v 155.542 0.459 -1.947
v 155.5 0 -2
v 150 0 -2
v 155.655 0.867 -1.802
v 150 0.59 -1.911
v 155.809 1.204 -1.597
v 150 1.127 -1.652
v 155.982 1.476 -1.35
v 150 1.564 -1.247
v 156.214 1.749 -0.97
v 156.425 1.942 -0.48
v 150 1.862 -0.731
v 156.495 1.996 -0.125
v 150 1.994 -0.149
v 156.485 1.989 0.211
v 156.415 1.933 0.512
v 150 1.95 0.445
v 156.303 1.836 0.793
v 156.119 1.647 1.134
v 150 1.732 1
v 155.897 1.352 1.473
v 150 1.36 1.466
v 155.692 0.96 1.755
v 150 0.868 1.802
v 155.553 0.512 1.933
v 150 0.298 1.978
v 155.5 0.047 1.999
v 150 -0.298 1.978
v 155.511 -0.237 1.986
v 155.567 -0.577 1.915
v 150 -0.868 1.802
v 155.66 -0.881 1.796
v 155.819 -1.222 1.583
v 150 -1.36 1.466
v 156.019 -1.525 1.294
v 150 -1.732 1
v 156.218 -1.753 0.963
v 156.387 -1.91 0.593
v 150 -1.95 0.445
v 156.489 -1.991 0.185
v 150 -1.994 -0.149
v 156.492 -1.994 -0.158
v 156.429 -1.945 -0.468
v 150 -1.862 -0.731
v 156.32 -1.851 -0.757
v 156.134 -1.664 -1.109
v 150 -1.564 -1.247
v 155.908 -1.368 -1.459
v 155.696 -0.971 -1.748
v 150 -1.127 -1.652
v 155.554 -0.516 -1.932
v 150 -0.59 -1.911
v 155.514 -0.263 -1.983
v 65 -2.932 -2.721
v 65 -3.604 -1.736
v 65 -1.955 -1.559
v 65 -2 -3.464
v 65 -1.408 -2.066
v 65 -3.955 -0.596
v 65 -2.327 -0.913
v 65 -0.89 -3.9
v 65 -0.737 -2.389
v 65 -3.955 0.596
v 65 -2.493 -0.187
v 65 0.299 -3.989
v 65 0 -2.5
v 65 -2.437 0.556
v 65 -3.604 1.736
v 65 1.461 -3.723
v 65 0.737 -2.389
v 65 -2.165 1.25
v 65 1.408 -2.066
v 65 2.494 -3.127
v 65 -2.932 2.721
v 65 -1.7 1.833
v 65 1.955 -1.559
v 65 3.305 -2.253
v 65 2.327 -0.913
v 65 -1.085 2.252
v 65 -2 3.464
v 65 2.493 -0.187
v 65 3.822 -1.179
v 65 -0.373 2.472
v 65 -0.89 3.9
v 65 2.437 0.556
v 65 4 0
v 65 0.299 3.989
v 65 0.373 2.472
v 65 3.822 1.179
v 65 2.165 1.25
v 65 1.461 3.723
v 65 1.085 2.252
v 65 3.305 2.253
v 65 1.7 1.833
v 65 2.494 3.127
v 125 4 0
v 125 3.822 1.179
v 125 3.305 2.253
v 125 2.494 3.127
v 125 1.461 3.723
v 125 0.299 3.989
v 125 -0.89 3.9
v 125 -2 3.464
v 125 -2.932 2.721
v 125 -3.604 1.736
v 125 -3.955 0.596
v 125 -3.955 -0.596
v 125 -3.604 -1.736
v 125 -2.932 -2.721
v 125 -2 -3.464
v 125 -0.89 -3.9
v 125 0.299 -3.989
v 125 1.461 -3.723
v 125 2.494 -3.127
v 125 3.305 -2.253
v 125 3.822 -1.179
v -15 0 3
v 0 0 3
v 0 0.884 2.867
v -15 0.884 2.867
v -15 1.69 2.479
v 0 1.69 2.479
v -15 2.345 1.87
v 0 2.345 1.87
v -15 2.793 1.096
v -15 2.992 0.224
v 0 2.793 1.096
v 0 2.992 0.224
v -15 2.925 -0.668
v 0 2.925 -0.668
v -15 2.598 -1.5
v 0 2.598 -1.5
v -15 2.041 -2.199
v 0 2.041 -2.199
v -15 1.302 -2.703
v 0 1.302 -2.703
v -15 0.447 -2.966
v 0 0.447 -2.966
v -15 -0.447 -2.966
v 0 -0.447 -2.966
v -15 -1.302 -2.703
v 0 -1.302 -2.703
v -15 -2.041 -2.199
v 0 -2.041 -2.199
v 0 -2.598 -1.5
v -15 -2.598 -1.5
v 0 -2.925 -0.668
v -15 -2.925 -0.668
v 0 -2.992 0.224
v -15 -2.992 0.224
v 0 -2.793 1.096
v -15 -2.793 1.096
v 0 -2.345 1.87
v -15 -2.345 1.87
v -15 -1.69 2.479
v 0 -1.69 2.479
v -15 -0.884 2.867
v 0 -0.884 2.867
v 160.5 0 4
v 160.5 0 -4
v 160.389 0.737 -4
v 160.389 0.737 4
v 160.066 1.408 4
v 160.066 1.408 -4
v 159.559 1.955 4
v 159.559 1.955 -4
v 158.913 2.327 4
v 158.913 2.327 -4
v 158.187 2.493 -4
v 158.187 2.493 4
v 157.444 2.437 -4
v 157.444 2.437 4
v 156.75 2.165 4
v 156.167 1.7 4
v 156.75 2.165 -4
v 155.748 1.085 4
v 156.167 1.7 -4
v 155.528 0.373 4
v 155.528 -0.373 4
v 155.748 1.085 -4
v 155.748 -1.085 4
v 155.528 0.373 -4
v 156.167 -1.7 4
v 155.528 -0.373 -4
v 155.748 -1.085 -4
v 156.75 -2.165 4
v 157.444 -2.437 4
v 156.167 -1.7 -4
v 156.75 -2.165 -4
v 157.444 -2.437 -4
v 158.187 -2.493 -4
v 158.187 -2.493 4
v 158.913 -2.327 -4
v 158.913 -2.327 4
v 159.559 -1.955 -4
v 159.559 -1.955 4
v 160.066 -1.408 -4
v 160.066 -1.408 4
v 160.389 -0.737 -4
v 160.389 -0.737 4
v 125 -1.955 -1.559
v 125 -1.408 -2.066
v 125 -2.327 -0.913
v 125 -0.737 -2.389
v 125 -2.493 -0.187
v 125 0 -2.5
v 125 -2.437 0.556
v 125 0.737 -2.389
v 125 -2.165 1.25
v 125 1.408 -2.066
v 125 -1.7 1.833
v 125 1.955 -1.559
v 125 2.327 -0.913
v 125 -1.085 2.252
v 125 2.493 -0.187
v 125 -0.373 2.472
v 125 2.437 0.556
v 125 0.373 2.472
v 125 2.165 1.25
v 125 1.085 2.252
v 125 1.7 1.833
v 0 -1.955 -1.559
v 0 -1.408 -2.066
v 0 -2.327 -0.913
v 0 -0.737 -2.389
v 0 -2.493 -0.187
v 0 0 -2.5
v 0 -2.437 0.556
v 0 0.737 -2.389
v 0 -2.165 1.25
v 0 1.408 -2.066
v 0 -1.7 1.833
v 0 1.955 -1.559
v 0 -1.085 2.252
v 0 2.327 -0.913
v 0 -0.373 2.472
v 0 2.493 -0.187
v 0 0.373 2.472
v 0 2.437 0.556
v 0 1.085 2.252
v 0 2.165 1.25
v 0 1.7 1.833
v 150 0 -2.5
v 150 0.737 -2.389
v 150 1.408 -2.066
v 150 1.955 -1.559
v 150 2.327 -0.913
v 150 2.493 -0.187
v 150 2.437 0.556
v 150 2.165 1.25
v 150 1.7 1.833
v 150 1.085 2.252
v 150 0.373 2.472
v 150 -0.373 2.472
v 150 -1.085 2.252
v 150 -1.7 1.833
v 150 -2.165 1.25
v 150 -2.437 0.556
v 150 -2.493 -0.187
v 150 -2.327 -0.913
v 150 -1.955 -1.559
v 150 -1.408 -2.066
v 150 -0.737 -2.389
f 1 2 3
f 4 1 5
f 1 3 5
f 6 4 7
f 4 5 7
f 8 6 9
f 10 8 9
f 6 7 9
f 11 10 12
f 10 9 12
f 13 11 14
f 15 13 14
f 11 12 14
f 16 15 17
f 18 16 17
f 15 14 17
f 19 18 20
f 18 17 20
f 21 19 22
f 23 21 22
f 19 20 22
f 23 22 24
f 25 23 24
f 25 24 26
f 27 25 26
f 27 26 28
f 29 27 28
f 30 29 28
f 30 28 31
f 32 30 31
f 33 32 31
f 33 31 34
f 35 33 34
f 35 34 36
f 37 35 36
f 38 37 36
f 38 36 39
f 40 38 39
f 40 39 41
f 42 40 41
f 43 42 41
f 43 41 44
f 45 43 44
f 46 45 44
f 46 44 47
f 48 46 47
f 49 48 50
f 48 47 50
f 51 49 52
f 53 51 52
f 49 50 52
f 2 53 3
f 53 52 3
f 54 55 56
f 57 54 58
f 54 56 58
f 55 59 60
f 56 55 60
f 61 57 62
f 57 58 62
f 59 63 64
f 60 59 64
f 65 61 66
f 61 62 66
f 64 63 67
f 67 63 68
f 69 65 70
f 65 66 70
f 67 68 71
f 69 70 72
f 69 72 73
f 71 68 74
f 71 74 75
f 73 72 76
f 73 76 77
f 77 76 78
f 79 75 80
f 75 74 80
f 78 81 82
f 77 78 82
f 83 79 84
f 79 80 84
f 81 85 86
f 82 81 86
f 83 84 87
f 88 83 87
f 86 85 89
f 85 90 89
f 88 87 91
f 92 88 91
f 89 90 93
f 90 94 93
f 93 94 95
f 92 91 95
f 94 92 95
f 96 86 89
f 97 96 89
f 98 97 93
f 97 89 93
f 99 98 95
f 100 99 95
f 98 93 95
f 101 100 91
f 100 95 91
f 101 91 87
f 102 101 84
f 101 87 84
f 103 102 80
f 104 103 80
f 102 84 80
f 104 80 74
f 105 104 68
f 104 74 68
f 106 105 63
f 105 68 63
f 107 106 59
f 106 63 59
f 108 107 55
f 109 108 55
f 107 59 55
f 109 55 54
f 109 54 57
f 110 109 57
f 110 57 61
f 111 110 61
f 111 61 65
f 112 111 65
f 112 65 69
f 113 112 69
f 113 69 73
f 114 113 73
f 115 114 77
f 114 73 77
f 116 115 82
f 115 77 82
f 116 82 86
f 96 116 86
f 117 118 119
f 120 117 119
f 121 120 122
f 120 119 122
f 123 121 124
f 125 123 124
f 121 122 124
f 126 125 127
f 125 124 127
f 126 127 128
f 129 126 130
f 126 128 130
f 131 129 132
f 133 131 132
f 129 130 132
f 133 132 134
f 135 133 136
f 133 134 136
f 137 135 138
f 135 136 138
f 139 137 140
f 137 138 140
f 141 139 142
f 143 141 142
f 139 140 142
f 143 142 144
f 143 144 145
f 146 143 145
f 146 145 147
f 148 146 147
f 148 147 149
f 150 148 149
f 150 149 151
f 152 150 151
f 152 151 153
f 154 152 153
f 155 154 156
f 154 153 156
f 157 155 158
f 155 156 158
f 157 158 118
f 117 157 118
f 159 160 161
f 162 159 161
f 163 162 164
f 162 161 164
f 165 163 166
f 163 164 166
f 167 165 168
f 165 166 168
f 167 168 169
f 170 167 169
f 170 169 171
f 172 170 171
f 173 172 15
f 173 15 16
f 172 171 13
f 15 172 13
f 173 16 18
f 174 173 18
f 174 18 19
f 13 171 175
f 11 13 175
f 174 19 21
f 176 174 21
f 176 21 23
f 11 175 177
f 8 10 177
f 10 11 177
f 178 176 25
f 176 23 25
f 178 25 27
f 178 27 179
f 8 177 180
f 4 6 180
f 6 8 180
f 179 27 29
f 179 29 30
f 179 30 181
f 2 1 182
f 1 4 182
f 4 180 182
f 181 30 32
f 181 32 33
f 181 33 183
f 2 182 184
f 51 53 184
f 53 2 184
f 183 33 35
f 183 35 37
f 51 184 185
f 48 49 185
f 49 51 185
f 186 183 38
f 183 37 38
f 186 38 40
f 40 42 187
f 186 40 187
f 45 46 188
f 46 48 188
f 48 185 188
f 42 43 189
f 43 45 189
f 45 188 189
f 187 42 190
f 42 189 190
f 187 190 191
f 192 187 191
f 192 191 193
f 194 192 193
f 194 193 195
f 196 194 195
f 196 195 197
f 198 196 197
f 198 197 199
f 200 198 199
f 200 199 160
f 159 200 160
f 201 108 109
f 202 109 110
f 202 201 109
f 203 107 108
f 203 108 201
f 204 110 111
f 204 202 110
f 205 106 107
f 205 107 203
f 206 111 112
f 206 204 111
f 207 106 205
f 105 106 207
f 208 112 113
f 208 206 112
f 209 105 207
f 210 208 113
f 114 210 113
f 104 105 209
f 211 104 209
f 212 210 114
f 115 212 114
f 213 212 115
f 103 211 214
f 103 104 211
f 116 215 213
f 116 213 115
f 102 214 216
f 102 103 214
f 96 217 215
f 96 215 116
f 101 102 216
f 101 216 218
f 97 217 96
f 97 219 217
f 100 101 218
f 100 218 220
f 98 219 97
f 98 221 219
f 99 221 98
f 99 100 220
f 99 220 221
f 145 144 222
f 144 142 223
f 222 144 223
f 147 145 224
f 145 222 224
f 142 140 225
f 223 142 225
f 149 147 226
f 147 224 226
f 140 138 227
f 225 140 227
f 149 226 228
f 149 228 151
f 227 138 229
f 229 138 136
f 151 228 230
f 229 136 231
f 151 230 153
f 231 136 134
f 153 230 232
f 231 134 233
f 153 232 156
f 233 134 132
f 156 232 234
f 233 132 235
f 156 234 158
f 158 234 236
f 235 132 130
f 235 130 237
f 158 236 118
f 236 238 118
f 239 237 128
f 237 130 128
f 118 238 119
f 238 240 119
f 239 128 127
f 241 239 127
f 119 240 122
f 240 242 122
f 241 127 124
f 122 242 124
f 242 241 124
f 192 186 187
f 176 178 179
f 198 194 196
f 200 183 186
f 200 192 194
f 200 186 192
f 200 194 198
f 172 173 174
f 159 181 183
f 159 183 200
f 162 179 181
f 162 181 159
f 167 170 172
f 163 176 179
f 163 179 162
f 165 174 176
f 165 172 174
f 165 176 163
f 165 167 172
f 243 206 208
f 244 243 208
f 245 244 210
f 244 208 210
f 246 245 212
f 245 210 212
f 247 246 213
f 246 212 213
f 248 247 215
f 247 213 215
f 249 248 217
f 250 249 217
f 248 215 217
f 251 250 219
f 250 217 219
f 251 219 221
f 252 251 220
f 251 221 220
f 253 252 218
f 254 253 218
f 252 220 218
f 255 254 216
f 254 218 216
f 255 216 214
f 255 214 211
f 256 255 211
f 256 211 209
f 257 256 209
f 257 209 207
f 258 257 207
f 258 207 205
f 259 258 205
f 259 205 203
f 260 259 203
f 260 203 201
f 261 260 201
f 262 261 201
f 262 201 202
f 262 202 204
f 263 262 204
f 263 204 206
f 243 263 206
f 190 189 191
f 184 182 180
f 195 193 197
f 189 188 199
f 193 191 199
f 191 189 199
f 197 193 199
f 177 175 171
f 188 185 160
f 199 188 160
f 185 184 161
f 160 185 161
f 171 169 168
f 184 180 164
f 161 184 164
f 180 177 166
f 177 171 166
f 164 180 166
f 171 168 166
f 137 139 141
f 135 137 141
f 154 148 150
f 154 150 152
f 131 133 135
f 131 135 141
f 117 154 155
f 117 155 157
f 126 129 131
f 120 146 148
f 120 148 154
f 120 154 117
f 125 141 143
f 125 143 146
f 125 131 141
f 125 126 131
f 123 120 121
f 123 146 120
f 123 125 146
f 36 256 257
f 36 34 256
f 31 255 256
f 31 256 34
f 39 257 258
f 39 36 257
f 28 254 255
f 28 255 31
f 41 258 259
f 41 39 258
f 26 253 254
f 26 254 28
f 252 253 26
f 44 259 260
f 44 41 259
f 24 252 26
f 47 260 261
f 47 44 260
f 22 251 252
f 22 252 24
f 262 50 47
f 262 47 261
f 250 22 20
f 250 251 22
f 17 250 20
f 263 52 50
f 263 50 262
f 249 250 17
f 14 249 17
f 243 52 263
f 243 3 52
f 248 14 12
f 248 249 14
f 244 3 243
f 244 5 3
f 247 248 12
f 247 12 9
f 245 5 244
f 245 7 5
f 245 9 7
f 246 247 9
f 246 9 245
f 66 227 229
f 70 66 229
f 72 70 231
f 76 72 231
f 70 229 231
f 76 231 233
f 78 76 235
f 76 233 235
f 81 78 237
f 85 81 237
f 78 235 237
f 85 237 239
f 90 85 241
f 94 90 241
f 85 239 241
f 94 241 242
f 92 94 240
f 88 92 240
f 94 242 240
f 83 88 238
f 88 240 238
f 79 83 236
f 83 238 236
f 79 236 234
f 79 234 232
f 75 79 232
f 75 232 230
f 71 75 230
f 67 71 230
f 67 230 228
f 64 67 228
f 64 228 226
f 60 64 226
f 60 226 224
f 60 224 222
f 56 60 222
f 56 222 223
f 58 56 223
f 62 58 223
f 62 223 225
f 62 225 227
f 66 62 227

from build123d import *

# Parameters (mm, degrees)
SKETCH1_R                = 2.5
BOSS_EXTRUDE1_DEPTH      = 150
SKETCH3_R                = 3
BOSS_EXTRUDE2_DEPTH      = 15
SKETCH4_R                = 2
BOSS_EXTRUDE3_DEPTH      = 8
BOSS_EXTRUDE4_DEPTH      = 4
BOSS_EXTRUDE4_DEPTH_BACK = 4
SKETCH5_R                = 2.5
F_3DSKETCH1_R            = 4
BOSS_EXTRUDE5_DEPTH      = 60


with BuildPart() as part:
    # Sketch1 → Boss-Extrude1 (new body)
    with BuildSketch(Plane(origin=(0, 0, 0), x_dir=(0, 0, -1), z_dir=(1, 0, 0))):
        Circle(SKETCH1_R)
    extrude(amount=BOSS_EXTRUDE1_DEPTH)

    # Sketch3 → Boss-Extrude2 (add)
    with BuildSketch(Plane.ZY):
        Circle(SKETCH3_R)
    extrude(amount=BOSS_EXTRUDE2_DEPTH)

    # Sketch4 → Boss-Extrude3 (add)
    with BuildSketch(Plane(origin=(150, 0, 0), x_dir=(0, 0, -1), z_dir=(1, 0, 0))):
        Circle(SKETCH4_R)
    extrude(amount=BOSS_EXTRUDE3_DEPTH)

    # Sketch5 → Boss-Extrude4 (add, two sides: drawn at the far end of the back side and taken through both)
    with BuildSketch(Plane.XY.offset(-BOSS_EXTRUDE4_DEPTH_BACK)):
        with Locations((158, 0)):
            Circle(SKETCH5_R)
    extrude(amount=BOSS_EXTRUDE4_DEPTH + BOSS_EXTRUDE4_DEPTH_BACK)

    # 3DSketch1 → Boss-Extrude5 (add)
    with BuildSketch(Plane(origin=(65, 0, 0), x_dir=(0, 0, 1), z_dir=(1, 0, 0))):
        Circle(F_3DSKETCH1_R)
    extrude(amount=BOSS_EXTRUDE5_DEPTH)


solid = part.part
